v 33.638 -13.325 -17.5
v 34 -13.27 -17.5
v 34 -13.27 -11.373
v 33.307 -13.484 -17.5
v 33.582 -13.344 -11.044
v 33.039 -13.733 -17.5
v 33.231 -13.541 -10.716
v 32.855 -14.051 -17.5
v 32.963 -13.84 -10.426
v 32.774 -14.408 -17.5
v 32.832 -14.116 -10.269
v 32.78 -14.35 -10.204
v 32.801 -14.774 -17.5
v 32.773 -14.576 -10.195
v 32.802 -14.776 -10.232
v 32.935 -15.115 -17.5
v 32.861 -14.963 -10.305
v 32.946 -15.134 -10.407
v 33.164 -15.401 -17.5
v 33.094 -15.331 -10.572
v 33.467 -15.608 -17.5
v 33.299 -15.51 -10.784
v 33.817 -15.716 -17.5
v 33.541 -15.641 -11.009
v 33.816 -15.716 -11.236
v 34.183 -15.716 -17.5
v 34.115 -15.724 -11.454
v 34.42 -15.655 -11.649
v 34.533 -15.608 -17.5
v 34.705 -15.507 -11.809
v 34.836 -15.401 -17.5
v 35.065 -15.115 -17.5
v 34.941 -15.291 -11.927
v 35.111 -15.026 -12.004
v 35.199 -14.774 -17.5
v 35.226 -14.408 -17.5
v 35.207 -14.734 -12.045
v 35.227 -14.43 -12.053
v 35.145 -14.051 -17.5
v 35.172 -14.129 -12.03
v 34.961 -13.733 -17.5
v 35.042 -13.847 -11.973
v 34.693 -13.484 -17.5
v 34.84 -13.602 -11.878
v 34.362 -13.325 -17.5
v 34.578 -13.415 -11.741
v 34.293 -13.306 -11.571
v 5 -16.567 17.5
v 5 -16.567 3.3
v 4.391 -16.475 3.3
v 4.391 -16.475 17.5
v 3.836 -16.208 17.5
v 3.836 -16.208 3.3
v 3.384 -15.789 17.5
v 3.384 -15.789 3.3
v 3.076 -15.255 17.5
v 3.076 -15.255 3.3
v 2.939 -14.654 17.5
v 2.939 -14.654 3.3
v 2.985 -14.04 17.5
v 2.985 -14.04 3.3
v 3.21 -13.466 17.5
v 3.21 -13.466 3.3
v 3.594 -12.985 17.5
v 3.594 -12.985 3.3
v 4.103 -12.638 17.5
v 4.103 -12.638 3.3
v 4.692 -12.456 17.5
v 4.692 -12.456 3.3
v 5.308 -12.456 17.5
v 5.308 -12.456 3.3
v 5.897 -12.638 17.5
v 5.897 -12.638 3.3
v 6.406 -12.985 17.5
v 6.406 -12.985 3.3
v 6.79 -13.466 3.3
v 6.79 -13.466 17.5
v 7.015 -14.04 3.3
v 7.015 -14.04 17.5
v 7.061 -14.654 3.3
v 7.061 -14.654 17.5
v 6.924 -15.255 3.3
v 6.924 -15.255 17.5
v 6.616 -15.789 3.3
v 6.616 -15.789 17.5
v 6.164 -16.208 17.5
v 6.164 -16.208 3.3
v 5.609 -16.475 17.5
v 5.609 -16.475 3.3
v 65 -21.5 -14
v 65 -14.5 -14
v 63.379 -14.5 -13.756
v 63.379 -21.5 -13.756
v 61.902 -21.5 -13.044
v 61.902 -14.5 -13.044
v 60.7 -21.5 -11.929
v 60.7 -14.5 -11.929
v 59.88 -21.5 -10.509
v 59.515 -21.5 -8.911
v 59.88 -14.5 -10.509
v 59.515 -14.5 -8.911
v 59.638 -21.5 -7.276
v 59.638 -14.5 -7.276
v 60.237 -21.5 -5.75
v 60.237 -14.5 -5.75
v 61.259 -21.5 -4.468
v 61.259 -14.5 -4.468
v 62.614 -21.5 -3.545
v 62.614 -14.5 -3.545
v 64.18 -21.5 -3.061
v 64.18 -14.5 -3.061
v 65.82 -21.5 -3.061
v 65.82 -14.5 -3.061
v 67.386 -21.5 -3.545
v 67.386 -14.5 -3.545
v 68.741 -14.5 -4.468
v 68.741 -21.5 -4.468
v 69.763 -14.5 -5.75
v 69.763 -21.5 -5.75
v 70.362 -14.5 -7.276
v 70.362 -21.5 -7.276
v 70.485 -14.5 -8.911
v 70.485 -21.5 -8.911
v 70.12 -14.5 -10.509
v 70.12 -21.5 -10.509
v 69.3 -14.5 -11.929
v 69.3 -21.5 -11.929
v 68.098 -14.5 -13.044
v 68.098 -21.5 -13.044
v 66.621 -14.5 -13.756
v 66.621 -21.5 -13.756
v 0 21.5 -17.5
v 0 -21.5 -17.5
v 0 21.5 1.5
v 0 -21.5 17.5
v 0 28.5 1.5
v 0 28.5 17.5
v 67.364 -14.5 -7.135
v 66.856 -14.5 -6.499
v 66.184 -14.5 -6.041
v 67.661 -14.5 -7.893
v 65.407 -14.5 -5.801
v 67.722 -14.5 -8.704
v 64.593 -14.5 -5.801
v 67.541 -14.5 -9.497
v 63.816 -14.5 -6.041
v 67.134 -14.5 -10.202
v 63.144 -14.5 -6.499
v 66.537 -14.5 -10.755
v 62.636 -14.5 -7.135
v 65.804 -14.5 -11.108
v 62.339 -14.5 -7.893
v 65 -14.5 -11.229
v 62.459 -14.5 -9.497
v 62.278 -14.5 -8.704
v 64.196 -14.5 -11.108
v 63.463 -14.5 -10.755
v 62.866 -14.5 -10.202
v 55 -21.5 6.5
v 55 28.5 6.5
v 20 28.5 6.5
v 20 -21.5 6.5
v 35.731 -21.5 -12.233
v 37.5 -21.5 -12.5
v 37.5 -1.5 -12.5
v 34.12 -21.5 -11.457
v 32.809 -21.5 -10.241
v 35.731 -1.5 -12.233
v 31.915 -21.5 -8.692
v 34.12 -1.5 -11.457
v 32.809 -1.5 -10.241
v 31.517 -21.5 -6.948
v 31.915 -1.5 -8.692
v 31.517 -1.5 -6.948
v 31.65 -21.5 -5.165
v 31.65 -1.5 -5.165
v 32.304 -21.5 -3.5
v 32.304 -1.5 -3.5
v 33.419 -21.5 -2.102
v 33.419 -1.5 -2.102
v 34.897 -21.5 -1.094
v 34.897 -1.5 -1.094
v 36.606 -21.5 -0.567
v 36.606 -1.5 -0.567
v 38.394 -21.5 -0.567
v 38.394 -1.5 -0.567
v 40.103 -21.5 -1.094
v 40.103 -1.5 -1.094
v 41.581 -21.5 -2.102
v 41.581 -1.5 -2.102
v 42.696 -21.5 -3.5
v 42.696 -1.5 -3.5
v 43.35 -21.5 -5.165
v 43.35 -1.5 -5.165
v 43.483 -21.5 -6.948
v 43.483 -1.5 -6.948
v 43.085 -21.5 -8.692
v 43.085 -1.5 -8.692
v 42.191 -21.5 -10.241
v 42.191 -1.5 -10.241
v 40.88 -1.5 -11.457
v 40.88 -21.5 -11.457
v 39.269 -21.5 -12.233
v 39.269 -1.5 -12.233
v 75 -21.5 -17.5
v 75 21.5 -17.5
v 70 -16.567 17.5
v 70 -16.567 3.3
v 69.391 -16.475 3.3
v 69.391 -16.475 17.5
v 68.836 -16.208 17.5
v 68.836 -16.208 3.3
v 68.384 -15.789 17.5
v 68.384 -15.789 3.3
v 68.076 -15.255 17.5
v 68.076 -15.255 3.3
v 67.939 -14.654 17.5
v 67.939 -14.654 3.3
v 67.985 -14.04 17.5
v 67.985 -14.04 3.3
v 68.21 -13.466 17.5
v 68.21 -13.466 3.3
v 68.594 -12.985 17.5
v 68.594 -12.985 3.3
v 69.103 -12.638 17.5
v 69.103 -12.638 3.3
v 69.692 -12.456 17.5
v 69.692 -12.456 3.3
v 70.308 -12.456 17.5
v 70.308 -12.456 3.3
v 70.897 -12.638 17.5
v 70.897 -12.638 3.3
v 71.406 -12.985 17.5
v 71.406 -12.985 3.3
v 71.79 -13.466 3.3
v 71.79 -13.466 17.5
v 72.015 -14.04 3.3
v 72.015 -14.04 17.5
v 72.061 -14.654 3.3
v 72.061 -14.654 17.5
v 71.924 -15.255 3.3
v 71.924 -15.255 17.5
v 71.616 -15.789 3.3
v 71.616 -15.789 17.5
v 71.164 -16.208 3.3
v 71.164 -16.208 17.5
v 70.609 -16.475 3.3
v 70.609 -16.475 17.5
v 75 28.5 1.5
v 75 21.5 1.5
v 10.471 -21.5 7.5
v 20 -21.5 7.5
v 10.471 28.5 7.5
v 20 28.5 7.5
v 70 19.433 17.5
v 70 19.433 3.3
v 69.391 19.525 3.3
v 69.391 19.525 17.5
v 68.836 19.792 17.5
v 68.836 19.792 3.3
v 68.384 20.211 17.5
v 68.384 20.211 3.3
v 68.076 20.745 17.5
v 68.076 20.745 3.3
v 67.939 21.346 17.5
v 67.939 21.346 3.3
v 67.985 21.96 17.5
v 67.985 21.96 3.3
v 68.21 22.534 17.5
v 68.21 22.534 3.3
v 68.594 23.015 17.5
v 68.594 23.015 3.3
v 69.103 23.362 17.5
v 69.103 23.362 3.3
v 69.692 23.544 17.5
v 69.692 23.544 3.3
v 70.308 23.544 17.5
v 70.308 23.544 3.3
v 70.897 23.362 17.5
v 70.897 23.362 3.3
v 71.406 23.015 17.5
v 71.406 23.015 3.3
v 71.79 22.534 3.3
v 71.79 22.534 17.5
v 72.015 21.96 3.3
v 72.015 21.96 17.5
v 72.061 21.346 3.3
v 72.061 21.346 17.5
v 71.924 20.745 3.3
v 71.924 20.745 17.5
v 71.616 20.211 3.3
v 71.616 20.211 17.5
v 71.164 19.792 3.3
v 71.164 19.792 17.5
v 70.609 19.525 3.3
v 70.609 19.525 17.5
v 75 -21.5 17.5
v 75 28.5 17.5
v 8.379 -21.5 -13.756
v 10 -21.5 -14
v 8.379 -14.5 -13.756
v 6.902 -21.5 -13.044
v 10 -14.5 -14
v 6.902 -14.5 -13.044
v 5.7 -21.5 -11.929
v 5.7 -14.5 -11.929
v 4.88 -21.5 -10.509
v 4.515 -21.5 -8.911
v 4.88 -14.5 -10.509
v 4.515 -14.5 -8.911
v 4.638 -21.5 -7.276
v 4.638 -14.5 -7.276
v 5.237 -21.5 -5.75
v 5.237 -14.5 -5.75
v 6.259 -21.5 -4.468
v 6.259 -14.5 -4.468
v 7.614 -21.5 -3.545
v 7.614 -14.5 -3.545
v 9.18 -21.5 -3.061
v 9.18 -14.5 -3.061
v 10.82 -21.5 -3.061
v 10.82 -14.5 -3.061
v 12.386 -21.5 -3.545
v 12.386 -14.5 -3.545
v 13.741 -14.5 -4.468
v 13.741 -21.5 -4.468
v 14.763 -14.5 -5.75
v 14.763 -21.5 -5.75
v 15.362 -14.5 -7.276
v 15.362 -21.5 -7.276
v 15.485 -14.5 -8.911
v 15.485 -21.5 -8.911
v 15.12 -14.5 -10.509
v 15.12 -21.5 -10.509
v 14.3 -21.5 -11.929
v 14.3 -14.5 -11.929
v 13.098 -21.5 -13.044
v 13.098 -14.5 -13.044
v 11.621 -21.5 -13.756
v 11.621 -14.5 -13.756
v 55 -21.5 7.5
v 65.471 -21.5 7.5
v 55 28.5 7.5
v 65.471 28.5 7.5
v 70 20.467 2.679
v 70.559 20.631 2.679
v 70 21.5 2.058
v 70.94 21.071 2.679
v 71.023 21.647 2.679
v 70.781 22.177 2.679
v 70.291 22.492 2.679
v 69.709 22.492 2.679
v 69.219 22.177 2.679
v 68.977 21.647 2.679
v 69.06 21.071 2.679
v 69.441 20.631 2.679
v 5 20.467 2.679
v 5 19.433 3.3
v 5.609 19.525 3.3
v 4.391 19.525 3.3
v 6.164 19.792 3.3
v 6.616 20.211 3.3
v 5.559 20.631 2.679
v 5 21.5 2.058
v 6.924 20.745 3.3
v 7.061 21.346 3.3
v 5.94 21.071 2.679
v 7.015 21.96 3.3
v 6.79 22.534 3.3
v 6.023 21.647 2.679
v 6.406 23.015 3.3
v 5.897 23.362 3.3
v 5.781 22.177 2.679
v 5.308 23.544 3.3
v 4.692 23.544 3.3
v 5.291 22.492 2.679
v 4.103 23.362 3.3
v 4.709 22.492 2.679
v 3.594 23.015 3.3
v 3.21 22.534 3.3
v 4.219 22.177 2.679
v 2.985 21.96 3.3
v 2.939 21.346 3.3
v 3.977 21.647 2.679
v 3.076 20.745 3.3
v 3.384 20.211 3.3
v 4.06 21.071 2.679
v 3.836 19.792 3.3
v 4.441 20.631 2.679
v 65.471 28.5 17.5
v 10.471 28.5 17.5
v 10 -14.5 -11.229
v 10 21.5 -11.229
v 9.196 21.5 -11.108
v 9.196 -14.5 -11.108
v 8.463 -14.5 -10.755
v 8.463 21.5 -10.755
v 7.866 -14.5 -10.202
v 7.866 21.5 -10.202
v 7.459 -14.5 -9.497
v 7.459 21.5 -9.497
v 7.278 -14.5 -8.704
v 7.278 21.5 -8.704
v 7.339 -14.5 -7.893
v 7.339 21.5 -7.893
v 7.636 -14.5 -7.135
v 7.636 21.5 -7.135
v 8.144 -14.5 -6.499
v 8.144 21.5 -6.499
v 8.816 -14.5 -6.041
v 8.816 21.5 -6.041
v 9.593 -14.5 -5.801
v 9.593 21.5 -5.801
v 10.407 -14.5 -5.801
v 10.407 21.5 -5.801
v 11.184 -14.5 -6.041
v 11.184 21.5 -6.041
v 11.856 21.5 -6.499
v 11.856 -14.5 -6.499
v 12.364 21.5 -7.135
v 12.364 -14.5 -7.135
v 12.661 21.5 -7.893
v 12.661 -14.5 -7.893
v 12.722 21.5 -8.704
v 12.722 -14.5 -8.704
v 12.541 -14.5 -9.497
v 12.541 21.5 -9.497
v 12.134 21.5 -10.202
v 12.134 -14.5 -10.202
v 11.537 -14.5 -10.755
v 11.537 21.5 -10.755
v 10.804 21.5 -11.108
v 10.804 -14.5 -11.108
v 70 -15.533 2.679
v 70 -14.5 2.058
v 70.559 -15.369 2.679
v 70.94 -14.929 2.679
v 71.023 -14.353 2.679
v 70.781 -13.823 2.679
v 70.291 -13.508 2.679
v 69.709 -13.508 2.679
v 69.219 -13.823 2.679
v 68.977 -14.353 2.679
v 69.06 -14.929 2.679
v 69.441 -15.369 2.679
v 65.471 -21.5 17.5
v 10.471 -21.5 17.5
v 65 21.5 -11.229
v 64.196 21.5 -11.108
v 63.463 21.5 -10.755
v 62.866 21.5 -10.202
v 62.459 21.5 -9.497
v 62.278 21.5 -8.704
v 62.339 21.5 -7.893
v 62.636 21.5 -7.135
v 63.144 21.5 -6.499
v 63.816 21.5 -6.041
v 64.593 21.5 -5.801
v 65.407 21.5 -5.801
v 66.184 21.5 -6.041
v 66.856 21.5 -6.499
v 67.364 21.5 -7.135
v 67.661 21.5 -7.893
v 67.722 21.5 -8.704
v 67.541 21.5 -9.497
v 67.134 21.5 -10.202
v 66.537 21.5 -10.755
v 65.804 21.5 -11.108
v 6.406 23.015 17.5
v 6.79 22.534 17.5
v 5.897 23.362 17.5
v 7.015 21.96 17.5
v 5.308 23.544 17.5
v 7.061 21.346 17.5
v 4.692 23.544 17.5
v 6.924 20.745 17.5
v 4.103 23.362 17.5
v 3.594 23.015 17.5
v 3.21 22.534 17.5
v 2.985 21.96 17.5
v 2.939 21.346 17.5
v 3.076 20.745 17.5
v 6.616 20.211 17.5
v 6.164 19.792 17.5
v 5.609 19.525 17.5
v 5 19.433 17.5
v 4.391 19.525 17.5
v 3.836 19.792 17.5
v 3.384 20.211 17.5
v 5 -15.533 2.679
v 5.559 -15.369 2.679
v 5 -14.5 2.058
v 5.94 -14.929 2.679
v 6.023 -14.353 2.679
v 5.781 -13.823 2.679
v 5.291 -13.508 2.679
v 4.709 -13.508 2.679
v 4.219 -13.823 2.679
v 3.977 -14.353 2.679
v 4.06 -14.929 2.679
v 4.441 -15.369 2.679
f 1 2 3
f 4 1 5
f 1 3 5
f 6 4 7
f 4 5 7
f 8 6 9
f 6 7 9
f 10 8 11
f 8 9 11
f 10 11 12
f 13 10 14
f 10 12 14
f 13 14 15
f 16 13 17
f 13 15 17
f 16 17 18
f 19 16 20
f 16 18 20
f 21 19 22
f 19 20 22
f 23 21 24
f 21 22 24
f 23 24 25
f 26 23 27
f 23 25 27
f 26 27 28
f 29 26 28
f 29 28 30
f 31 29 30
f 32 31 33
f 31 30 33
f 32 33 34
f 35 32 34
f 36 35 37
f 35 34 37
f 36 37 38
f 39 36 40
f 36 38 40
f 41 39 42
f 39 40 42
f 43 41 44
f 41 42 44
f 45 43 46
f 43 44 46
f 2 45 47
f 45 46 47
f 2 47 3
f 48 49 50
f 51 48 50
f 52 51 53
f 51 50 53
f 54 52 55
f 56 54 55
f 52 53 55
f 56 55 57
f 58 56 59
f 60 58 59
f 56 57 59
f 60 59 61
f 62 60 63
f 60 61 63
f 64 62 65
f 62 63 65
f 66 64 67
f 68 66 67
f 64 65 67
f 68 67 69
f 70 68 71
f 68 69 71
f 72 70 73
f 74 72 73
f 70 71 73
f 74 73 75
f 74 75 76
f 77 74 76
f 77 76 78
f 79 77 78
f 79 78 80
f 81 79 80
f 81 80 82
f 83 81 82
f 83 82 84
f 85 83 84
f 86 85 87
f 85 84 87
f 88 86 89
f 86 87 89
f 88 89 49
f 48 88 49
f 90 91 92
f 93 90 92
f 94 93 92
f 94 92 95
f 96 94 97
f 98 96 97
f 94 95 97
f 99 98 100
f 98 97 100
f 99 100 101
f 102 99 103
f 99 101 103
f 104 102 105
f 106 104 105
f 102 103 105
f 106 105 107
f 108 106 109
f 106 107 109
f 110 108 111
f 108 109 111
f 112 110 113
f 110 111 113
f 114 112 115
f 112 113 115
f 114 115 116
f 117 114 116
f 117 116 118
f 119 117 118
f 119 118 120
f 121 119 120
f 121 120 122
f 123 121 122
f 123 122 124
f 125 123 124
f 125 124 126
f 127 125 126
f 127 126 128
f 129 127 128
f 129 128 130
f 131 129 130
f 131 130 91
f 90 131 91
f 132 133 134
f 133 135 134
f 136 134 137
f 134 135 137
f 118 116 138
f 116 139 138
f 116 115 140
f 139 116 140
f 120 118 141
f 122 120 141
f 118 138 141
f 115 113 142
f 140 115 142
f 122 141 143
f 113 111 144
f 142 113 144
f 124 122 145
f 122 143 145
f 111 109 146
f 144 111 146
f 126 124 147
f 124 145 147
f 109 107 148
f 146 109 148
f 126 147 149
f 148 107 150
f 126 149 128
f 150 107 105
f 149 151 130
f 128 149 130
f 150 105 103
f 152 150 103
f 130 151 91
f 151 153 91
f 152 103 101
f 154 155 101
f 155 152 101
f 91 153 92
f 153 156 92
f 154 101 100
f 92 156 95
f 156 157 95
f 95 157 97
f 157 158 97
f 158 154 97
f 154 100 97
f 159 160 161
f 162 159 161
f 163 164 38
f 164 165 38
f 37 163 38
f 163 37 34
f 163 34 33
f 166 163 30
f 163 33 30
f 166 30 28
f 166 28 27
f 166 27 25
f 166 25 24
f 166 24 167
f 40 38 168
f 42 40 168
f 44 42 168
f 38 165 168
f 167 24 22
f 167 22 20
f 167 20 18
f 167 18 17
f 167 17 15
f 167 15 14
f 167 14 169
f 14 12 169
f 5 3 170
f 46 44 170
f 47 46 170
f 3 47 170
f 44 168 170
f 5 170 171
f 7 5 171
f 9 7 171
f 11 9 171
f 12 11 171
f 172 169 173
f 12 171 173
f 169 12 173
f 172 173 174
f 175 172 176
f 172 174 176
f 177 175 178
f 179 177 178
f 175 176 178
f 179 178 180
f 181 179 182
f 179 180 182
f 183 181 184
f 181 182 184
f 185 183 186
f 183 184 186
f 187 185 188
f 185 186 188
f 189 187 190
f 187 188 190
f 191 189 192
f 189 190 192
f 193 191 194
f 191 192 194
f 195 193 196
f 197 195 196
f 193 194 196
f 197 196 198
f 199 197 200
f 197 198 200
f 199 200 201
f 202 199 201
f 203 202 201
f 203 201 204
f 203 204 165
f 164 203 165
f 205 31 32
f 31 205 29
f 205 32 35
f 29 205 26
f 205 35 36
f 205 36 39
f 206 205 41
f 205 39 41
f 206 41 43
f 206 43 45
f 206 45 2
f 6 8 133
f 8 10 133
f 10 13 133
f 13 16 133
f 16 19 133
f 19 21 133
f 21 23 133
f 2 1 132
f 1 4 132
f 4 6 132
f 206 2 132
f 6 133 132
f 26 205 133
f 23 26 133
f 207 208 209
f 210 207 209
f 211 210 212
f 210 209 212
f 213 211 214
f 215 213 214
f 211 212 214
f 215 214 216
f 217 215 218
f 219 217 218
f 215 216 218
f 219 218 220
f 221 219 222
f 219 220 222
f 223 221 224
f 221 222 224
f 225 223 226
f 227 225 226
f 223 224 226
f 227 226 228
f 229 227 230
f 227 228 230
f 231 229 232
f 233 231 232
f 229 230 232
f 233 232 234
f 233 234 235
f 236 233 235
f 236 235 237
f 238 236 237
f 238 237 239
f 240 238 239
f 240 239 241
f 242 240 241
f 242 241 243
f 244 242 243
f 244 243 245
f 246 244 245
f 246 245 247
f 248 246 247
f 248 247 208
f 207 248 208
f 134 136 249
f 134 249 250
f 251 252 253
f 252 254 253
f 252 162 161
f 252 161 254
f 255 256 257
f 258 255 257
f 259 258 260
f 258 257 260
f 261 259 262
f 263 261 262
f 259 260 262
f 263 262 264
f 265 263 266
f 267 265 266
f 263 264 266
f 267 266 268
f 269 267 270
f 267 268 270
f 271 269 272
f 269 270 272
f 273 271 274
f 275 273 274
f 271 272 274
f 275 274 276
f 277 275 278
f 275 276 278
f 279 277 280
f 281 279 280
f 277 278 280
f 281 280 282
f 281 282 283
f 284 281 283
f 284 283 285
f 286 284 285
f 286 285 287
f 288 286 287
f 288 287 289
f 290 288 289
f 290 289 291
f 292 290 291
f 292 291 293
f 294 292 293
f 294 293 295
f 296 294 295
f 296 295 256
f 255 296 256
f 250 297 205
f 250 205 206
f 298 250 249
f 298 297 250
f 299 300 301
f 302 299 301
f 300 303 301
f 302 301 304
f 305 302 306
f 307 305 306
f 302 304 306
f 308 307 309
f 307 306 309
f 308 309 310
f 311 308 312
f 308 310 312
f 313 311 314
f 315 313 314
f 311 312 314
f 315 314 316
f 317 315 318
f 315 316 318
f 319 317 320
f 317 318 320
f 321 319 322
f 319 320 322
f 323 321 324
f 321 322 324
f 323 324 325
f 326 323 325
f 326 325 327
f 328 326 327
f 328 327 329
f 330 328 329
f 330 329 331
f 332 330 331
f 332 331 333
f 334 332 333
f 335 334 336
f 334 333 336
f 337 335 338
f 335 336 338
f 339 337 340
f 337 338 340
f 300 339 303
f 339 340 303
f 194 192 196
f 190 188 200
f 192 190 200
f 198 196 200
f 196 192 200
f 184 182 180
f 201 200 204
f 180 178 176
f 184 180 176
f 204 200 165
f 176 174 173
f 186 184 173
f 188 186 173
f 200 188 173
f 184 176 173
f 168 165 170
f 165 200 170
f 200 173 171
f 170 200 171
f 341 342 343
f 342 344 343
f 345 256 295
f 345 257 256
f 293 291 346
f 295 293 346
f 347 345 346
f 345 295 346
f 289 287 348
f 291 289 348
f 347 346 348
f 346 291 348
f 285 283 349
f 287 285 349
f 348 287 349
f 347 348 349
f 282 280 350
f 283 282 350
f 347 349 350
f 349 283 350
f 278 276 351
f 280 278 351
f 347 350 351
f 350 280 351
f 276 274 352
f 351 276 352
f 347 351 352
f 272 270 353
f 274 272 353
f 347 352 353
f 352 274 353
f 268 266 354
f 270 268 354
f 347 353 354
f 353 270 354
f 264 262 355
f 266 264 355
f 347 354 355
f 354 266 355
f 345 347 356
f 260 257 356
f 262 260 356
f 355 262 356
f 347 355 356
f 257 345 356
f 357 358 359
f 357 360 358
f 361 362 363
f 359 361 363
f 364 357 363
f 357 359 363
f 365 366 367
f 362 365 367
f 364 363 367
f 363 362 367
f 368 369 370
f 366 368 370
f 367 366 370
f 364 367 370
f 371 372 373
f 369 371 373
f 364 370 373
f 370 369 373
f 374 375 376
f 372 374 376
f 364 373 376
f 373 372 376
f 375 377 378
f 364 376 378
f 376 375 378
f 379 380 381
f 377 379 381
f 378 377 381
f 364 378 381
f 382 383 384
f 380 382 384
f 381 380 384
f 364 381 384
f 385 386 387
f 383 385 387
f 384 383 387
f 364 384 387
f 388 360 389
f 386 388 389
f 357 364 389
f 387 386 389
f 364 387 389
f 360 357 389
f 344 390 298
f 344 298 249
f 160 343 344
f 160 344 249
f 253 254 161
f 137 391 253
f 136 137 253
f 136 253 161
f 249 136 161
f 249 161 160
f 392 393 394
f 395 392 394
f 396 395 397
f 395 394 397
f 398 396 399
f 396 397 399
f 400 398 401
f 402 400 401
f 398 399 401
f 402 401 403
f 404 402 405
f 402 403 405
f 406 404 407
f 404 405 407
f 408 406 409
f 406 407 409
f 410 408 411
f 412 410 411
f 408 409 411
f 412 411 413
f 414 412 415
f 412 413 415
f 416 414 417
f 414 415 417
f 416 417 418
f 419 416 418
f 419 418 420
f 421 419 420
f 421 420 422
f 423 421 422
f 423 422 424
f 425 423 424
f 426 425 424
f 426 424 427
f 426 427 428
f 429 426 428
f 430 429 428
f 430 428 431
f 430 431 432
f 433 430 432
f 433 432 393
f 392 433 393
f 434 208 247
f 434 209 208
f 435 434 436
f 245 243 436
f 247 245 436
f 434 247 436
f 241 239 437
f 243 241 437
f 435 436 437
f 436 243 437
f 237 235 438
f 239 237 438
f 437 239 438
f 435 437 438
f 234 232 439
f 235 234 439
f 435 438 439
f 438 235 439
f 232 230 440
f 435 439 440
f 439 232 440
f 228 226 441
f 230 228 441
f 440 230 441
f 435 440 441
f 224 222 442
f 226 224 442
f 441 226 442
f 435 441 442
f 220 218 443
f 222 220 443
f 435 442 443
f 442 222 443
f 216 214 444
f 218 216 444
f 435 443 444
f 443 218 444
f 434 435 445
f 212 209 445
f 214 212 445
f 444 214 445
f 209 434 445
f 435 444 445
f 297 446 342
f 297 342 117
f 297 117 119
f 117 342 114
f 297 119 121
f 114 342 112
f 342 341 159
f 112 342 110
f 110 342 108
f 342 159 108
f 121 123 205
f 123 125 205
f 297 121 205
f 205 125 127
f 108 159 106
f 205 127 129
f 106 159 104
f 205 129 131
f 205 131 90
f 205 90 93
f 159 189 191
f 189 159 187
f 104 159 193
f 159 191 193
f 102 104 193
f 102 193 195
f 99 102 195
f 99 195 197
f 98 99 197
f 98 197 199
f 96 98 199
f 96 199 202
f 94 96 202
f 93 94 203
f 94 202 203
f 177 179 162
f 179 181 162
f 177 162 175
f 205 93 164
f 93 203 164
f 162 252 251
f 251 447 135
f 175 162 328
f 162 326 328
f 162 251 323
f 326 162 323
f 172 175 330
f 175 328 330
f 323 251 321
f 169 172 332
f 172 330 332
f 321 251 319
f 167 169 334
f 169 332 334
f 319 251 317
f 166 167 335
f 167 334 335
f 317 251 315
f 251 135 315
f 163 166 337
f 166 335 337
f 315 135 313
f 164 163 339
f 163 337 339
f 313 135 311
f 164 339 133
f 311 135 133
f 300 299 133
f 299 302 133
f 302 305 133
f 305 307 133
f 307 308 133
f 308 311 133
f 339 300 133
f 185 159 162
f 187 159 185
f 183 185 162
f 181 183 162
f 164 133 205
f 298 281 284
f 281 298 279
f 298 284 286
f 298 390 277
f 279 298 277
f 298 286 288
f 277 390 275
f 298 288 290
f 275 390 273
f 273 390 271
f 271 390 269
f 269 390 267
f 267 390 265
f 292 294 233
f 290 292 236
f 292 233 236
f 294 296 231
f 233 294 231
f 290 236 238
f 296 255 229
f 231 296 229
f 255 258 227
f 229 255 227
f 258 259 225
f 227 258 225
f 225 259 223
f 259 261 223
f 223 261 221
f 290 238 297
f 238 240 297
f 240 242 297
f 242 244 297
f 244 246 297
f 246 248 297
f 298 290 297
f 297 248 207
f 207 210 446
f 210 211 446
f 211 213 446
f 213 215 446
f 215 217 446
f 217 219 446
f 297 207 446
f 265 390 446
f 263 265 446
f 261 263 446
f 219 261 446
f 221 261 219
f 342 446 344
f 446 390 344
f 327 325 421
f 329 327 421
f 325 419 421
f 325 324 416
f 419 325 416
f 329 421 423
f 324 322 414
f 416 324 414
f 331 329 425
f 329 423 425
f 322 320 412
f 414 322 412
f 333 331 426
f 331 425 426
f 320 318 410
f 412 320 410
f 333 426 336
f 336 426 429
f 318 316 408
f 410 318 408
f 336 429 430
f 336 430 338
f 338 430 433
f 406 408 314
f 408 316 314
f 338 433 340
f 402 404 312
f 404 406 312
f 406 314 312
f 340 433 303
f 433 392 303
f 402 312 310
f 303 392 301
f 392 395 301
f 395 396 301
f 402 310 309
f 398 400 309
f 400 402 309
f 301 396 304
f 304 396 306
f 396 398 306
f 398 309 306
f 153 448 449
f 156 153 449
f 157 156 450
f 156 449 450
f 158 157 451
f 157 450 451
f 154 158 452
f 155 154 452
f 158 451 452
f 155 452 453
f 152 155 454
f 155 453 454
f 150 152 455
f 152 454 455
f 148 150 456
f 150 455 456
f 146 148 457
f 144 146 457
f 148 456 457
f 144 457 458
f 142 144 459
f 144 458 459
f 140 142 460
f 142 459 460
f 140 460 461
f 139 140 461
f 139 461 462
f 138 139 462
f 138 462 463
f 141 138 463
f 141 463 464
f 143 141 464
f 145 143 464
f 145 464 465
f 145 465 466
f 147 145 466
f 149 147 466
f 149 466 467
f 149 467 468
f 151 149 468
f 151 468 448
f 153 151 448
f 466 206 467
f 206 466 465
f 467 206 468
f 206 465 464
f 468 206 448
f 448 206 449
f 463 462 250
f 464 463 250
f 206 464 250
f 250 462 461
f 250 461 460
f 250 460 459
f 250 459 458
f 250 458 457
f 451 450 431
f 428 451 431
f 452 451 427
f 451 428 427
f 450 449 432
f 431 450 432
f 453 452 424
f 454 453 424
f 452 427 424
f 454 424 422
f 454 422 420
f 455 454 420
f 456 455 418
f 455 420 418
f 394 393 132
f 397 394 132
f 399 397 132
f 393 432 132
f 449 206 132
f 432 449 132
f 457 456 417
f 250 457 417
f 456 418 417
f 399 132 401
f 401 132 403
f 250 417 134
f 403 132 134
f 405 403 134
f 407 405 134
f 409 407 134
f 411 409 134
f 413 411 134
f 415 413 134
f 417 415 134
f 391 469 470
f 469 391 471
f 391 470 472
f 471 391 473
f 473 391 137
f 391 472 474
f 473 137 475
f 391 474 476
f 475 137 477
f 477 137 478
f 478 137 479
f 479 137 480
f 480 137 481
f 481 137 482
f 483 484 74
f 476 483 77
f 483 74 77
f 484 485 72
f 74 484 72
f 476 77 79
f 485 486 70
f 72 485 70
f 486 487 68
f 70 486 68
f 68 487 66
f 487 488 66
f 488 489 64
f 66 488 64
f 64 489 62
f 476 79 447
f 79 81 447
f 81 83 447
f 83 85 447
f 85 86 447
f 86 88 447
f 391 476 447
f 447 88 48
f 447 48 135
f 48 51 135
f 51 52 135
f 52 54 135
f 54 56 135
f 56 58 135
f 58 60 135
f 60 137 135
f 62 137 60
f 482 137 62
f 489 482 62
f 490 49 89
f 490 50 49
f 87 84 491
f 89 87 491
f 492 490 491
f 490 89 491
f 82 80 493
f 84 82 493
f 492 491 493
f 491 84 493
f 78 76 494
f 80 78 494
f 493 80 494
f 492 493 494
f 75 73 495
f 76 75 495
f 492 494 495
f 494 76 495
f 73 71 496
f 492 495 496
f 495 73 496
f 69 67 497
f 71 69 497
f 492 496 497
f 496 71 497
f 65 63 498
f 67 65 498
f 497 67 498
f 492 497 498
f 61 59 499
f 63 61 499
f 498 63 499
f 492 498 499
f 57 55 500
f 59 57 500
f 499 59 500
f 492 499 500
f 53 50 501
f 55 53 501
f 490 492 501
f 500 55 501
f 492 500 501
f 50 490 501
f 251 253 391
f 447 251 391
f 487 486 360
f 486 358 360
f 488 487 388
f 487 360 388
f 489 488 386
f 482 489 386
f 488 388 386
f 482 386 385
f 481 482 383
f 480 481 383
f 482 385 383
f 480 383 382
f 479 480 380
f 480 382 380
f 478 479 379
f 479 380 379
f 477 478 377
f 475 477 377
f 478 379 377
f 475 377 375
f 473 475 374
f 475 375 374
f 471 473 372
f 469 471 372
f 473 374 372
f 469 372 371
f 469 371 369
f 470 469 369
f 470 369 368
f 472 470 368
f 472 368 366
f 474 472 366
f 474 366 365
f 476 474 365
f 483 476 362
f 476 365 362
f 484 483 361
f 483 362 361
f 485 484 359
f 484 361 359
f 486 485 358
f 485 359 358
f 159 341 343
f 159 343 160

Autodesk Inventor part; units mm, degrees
ref_plane "YZ Plane" through (0, 0, 0) normal (1, 0, 0) x (0, 1, 0)
ref_plane "XZ Plane" through (0, 0, 0) normal (0, 1, 0) x (-1, 0, 0)
ref_plane "XY Plane" through (0, 0, 0) normal (0, 0, 1) x (1, 0, 0)
sketch "Sketch1" plane through (0, 0, 0) normal (1, 0, 0) x (0, 1, 0)
  line L0 (-21.5, -17.5) -> (21.5, -17.5)
  line L1 (21.5, -17.5) -> (21.5, 1.5)
  line L2 (21.5, 17.5) -> (-21.5, 17.5)
  line L3 (-21.5, 17.5) -> (-21.5, -17.5)
  line L4 (-21.5, -17.5) -> (21.5, 17.5) construction
  line L5 (21.5, -17.5) -> (-21.5, 17.5) construction
  line L6 (18.0188, 17.5) -> (28.5, 17.5)
  line L7 (28.5, 17.5) -> (28.5, 1.5)
  line L8 (28.5, 1.5) -> (21.5, 1.5)
  point P0 (0, 0)
  dimension "d0" = 43
  dimension "d1" = 35
  dimension "d2" = 50
  dimension "d3" = 16
extrude "Extrusion1" add sketch "Sketch1" along normal blind 75
sketch "Sketch2" plane through (0, 28.5, 17.5) normal (0, 1, 0) x (1, 0, 0)
  line L0 (0, 0) -> (75, 0) projected
  line L1 (65.4712, 0) -> (65.4712, 10)
  line L2 (65.4712, 10) -> (55, 10)
  line L3 (55, 10) -> (55, 11)
  line L4 (55, 11) -> (20, 11)
  line L5 (20, 11) -> (20, 10)
  line L6 (20, 10) -> (10.4712, 10)
  line L7 (10.4712, 10) -> (10.4712, 0)
  line L8 (0, 35) -> (75, 35) projected
  line L9 (37.5, 35) -> (37.5, 5.3668)
  point P0 (0, 17.5)
  dimension "d6" = 55
  dimension "d7" = 35
  dimension "d8" = 17.5
  dimension "d9" = 11
  dimension "d10" = 10
extrude "Extrusion2" cut sketch "Sketch2" against normal blind 75
sketch "Sketch6" plane through (0, -21.5, 17.5) normal (0, 0, 1) x (1, 0, 0)
  line L0 (0, 50) -> (0, 0) projected
  line L1 (0, 0) -> (10.4712, 0) projected
  point P0 (0, 21.5)
  point P1 (5, 7)
  dimension "d31" = 5
  dimension "d32" = 7
hole "Hole1" at (5, -14.5, 17.5) direction (0, 0, -1) diameter 4.134 depth 14.2 tip angle 118 thread size "M5x0.8" class "6H" standard "ISO Metric profile"
pattern_linear "Rectangular Pattern1" count 2 spacing 36 along (0, 1, 0) count 2 spacing 65 along (1, 0, 0) of "Hole1"
sketch "Sketch8" plane through (0, -21.5, -17.5) normal (0, -1, 0) x (1, 0, 0)
  line L0 (0, 35) -> (0, 0) projected
  line L1 (0, 35) -> (10.4712, 35) projected
  point P0 (0, 17.5)
  point P1 (37.5, 11)
  dimension "d55" = 37.5
  dimension "d56" = 24
hole "Hole3" at (37.5, -21.5, -6.5) direction (0, 1, 0) diameter 12 depth 20
sketch "Sketch9" plane through (0, -21.5, -17.5) normal (0, 0, -1) x (-1, 0, 0)
  line L0 (0, 0) -> (0, 43) projected
  line L1 (0, 0) -> (-75, 0) projected
  point P0 (0, 21.5)
  point P1 (-34, 7)
  dimension "d64" = 34
  dimension "d65" = 7
hole "Hole4" at (34, -14.5, -17.5) direction (0, 0, 1) diameter 2.459 depth 8.8 thread size "M3x0.5" class "6H" standard "ISO Metric profile"
sketch "Sketch10" plane through (0, -21.5, -17.5) normal (0, -1, 0) x (1, 0, 0)
  line L0 (0, 35) -> (0, 0) projected
  line L1 (0, 35) -> (10.4712, 35) projected
  line L2 (65.4712, 35) -> (75, 35) projected
  point P0 (0, 17.5)
  point P1 (65, 9)
  point P2 (10, 9)
  dimension "d84" = 10
  dimension "d85" = 55
  dimension "d86" = 26
  dimension "d87" = 26
hole "Hole6" at (65, -21.5, -8.5) at (10, -21.5, -8.5) direction (0, 1, 0) diameter 5.4587 end through all counterbore diameter 11 counterbore depth 7 thread size "M6x0.5" class "6H" standard "ISO Metric profile"
properties part number "Lose Backe"
